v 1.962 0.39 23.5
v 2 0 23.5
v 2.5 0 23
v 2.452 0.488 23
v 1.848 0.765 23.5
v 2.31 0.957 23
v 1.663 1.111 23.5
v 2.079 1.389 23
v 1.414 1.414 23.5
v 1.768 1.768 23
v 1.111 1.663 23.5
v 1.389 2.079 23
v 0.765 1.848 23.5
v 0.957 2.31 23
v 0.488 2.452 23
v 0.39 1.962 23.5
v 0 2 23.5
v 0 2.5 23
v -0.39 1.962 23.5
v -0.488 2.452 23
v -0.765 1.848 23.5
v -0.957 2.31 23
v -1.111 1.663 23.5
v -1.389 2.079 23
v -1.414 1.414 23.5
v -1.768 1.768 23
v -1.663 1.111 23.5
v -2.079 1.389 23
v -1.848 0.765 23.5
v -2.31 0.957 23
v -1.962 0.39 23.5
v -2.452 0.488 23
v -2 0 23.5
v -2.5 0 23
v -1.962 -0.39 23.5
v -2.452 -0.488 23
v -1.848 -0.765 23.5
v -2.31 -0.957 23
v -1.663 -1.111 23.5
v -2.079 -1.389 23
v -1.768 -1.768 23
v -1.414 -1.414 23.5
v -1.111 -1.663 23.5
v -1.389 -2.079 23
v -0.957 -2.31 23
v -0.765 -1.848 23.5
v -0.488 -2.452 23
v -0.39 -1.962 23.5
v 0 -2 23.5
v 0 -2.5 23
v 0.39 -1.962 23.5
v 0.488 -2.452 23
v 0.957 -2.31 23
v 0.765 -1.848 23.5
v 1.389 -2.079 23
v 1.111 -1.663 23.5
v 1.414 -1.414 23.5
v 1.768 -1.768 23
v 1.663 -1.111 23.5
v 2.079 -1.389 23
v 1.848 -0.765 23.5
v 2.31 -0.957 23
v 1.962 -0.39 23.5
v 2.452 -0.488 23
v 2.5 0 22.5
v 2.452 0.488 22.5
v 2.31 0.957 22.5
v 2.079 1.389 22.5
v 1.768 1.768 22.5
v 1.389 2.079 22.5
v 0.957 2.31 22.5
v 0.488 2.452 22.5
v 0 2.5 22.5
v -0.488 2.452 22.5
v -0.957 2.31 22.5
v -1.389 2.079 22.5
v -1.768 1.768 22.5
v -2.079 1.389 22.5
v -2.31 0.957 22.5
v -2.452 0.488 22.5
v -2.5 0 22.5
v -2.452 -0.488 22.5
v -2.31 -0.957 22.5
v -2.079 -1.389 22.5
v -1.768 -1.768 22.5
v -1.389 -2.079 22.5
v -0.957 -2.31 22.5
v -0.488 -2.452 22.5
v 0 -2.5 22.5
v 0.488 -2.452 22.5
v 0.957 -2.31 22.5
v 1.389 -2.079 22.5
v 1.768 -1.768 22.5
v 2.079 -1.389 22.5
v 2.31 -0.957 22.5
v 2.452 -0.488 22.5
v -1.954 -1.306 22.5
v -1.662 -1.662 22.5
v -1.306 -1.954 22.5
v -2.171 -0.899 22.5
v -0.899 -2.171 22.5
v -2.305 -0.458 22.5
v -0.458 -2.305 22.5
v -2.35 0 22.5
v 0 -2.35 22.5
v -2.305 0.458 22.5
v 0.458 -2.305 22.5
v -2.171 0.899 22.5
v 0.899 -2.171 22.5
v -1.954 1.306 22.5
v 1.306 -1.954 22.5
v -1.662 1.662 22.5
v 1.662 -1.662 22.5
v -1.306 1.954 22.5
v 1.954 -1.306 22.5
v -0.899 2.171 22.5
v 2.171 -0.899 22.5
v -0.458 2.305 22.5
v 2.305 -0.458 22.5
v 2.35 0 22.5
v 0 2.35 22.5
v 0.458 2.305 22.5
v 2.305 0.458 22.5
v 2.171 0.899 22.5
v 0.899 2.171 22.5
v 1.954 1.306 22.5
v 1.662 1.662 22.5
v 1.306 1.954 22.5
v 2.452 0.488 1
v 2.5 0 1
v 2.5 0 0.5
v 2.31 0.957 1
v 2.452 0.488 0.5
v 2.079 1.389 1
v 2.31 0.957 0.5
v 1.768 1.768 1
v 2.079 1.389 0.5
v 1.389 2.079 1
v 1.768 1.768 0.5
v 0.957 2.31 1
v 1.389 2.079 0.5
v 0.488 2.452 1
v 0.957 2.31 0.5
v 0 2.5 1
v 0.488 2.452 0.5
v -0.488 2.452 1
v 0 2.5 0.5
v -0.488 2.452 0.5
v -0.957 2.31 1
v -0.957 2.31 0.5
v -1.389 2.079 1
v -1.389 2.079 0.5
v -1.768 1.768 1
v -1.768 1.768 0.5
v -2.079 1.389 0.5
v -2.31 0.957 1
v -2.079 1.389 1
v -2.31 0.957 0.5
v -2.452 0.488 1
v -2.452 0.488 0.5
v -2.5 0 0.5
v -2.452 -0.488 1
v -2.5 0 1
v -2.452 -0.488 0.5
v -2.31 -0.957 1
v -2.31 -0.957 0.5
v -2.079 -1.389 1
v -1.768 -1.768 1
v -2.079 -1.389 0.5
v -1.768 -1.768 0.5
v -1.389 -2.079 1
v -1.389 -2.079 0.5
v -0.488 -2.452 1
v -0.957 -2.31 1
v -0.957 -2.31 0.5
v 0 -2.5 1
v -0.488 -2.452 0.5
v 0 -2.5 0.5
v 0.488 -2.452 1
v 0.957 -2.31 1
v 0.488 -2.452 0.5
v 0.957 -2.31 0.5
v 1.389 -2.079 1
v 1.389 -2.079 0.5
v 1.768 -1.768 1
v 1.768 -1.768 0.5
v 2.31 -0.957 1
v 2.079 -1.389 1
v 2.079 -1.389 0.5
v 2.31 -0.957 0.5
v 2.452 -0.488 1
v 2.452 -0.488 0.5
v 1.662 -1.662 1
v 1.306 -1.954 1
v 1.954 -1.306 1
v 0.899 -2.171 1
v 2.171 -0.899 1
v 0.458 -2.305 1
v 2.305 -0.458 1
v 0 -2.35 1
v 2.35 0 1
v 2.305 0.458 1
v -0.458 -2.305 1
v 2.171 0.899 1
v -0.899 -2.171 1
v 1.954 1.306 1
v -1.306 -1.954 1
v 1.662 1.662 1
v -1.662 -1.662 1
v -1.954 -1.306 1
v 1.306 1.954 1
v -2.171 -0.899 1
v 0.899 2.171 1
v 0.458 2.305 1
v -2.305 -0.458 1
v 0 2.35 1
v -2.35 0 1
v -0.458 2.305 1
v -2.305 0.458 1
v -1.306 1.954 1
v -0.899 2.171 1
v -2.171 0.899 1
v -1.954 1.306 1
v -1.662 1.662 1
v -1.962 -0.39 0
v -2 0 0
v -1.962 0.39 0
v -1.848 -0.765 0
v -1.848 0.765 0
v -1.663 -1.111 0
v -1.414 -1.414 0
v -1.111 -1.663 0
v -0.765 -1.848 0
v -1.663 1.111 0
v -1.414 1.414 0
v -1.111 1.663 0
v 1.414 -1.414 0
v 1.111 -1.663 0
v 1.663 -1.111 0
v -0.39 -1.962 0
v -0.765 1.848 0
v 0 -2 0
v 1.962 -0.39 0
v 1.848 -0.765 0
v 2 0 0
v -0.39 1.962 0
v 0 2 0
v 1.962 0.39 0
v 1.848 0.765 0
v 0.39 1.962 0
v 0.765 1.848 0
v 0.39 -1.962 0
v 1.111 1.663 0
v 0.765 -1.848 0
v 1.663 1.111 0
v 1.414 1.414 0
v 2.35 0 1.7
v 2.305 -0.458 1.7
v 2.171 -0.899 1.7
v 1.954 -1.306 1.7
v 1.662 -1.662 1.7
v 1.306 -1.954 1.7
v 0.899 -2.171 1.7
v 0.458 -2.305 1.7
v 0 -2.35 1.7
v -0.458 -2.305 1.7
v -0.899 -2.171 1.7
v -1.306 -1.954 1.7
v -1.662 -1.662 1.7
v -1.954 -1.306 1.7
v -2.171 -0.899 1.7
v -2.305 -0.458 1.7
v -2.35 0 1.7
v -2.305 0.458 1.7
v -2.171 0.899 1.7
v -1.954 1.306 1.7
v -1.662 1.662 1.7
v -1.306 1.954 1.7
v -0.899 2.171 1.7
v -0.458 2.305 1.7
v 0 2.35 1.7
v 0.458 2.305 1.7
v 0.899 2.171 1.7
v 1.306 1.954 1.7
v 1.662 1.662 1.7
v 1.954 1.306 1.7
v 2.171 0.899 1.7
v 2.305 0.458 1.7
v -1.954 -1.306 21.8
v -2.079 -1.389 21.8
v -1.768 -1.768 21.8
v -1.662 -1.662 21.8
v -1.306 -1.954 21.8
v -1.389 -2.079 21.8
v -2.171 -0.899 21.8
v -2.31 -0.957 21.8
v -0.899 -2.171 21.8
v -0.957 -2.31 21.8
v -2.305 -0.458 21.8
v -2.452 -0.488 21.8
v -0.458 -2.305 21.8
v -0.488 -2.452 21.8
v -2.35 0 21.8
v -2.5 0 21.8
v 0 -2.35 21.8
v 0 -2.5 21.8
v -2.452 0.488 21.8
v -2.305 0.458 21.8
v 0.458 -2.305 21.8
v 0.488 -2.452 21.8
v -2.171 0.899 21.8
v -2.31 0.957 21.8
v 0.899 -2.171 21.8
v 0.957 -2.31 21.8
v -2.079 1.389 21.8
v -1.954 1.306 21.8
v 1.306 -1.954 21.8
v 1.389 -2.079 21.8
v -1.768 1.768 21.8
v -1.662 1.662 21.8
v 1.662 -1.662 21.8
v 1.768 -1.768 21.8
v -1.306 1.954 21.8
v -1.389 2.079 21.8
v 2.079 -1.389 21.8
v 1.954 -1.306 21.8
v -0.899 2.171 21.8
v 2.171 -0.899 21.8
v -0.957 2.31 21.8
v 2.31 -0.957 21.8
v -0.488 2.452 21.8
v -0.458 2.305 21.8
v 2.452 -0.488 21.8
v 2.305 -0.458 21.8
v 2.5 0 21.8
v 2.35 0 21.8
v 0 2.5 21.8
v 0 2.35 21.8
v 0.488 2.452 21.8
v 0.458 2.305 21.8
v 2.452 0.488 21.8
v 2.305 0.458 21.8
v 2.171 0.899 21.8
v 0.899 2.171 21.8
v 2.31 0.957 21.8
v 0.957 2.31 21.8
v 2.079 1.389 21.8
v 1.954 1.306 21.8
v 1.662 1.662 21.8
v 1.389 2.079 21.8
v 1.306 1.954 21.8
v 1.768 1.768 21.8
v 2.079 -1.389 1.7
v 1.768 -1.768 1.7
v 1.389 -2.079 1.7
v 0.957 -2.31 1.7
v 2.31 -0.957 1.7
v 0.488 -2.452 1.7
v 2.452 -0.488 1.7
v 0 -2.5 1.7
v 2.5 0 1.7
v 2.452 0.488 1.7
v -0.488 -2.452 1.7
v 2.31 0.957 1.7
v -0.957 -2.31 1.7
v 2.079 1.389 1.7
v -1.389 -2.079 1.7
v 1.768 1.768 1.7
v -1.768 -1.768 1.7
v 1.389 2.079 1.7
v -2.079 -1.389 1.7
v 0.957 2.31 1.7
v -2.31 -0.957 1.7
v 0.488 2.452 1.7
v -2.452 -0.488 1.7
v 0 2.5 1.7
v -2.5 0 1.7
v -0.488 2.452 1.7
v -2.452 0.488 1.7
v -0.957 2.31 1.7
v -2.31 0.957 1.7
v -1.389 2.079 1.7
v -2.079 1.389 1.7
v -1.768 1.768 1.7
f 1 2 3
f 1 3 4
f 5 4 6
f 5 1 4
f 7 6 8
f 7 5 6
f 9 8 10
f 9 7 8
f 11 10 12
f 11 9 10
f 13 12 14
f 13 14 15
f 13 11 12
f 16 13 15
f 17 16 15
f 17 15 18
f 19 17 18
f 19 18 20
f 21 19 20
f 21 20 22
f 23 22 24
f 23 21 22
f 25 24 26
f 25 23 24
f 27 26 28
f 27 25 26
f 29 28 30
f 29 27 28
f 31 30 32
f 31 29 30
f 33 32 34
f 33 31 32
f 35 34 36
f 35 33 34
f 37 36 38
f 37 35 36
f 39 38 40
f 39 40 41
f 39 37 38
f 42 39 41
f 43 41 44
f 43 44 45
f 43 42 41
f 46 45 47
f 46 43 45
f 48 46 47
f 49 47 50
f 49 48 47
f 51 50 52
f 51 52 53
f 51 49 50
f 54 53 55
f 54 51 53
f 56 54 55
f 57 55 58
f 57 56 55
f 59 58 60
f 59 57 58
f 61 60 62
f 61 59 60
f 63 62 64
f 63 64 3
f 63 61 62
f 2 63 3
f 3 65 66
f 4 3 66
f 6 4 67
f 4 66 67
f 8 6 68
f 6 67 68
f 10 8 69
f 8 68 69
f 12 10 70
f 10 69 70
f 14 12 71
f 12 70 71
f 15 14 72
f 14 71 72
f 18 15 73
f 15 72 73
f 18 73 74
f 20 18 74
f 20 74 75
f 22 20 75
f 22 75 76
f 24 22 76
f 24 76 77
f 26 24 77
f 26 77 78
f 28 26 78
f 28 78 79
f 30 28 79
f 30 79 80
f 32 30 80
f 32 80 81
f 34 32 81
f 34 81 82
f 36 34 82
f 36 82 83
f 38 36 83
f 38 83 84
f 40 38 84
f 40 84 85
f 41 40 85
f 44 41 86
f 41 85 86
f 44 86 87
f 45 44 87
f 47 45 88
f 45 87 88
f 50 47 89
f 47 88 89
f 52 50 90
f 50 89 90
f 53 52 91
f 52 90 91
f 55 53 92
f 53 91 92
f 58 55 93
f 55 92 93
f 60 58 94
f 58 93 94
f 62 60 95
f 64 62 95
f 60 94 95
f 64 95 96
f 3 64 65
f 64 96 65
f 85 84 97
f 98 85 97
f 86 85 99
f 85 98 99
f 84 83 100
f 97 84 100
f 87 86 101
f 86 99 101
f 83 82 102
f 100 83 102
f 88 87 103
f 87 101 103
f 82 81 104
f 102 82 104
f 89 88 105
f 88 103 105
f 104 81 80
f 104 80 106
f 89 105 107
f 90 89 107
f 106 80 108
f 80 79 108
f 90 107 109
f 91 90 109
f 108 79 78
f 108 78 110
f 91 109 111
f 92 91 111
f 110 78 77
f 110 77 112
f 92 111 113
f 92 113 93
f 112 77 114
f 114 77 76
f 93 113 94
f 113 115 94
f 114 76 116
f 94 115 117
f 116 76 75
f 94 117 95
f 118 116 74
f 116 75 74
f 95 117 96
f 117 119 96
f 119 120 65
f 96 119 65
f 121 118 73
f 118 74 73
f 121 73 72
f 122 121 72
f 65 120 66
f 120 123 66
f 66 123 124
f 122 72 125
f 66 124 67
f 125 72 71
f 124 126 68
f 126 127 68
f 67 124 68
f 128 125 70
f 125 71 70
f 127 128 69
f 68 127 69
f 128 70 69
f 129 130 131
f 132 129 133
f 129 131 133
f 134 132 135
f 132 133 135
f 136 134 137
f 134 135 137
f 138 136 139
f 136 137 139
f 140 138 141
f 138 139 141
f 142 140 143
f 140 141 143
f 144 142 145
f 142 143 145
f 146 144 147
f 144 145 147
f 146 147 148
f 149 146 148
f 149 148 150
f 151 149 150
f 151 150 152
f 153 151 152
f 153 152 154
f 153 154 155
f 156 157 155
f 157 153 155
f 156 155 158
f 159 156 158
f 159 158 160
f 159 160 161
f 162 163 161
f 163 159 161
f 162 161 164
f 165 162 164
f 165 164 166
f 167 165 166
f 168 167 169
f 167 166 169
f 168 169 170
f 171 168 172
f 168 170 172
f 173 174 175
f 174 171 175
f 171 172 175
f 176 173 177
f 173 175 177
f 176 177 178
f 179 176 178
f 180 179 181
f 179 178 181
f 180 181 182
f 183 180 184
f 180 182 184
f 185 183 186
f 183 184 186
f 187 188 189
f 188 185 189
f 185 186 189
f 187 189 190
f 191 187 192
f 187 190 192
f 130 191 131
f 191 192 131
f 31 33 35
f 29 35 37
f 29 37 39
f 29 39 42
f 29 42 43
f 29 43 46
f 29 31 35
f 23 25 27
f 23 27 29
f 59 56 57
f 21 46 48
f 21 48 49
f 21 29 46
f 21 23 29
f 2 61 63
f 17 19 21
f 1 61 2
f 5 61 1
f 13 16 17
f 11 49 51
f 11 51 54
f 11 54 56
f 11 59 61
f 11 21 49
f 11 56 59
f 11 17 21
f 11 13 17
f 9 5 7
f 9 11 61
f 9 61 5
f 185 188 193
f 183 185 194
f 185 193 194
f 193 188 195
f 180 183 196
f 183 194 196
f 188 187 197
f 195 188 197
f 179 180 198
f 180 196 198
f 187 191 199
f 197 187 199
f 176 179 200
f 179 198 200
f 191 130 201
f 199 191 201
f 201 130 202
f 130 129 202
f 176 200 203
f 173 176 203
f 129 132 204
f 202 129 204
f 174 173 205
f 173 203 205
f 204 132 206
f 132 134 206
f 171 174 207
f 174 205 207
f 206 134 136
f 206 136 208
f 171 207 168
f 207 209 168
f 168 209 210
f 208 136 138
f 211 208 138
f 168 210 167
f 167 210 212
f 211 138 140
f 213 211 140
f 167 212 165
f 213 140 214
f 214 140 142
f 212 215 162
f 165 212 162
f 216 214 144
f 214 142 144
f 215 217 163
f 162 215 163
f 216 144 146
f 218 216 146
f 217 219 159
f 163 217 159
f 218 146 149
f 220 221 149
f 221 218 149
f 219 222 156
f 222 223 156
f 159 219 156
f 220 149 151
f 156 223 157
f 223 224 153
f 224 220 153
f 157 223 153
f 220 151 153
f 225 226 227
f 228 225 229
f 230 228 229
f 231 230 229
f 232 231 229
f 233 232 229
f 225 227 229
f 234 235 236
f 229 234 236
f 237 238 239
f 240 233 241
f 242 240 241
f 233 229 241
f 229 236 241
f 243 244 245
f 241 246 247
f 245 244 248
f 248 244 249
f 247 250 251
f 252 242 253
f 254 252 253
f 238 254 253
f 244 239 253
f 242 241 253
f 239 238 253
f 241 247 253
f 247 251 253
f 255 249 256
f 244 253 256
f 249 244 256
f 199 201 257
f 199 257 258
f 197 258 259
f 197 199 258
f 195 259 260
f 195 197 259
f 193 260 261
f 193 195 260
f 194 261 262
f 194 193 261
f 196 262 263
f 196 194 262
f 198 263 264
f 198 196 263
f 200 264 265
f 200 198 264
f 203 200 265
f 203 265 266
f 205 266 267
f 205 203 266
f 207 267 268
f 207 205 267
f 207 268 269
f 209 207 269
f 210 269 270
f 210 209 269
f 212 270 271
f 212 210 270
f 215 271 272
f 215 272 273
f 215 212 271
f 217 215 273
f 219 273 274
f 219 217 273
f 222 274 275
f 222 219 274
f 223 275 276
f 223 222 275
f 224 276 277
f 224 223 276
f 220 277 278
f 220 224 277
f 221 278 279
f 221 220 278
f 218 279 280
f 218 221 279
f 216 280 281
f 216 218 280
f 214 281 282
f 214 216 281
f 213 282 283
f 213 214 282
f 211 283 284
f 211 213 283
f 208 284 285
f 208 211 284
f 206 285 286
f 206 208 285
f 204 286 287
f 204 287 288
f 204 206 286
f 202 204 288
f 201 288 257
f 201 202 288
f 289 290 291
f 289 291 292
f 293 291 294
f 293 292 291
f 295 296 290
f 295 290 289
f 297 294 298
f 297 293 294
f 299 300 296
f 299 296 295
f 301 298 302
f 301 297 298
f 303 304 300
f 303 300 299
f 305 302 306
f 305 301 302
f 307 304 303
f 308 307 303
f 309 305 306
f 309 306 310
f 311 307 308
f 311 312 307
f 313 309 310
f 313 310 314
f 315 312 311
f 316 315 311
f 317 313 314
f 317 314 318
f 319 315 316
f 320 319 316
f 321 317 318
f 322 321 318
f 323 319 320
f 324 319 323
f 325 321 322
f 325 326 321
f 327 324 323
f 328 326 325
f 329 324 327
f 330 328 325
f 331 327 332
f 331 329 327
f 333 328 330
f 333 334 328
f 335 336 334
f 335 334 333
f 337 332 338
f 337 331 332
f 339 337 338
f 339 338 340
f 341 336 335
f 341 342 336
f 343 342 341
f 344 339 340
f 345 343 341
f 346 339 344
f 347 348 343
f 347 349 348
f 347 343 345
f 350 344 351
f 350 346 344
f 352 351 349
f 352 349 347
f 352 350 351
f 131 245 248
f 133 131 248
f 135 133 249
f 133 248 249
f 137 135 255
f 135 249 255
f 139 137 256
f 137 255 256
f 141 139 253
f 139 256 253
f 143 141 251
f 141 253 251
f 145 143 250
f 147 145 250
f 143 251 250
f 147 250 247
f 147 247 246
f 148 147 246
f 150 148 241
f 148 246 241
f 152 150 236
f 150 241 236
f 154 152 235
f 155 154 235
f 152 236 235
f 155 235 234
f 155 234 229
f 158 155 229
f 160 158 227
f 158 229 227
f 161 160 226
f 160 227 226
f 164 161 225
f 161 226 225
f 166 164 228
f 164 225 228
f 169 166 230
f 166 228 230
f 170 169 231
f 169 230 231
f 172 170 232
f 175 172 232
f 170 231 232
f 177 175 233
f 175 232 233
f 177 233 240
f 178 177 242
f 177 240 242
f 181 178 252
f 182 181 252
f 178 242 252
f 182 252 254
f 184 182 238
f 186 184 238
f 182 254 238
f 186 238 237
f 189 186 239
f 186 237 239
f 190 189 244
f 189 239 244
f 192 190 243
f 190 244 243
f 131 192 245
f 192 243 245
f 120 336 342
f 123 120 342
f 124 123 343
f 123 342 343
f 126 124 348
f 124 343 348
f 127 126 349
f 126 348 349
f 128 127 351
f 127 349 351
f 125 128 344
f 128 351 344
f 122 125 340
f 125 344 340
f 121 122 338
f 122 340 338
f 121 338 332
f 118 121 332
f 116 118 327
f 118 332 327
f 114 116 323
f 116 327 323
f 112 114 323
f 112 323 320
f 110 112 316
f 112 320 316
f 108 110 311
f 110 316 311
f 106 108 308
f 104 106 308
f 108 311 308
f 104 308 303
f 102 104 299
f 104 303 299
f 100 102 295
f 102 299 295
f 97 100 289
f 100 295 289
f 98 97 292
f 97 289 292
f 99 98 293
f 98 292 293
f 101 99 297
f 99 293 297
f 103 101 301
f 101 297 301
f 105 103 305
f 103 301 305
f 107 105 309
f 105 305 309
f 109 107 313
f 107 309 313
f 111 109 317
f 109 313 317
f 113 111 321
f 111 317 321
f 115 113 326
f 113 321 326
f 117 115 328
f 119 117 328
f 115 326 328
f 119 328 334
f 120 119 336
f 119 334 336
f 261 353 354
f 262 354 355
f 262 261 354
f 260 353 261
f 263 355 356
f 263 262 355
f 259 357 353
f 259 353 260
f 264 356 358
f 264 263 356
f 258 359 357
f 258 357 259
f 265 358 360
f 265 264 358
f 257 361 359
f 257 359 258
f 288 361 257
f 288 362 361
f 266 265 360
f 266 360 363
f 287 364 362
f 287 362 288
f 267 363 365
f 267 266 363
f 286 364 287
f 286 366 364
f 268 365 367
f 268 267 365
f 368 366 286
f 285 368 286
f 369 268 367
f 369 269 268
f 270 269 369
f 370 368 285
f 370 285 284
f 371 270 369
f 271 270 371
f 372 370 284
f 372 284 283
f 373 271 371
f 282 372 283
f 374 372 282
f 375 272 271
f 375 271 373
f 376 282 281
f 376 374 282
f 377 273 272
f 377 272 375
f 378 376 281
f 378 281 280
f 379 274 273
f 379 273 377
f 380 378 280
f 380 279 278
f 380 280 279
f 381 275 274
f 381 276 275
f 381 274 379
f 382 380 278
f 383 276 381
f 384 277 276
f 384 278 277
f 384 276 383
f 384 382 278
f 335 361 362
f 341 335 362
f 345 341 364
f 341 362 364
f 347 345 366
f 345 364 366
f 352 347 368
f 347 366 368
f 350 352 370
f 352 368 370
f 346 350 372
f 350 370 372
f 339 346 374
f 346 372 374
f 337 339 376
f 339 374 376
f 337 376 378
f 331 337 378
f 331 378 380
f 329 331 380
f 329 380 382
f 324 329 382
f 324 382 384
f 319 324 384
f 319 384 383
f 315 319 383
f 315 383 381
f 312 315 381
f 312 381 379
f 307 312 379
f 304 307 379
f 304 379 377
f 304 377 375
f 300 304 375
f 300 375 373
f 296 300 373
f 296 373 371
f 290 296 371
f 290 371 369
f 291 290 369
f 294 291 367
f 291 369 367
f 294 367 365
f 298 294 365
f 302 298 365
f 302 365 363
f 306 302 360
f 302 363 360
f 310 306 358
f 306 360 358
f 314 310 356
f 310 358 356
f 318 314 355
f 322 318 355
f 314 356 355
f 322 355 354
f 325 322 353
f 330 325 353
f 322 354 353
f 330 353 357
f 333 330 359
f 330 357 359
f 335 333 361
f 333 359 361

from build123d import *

# Parameters (mm, degrees)
SZKIC1_R                    = 2.5
DODANIE_WYCI_GNI_CIE1_DEPTH = 23.5
SFAZOWANIE1_SIZE            = 0.5
WYTNIJ_WYCI_GNI_CIE1_START  = -1.7
SZKIC2_R                    = 2.5
SZKIC2_R_2                  = 2.35
WYTNIJ_WYCI_GNI_CIE1_DEPTH  = 0.7
WYTNIJ_WYCI_GNI_CIE2_START  = -1
SZKIC3_R                    = 2.5
SZKIC3_R_2                  = 2.35
WYTNIJ_WYCI_GNI_CIE2_DEPTH  = 0.7


with BuildPart() as part:
    # Szkic1 → Dodanie-wyciągnięcie1 (new body)
    with BuildSketch(Plane.XY):
        Circle(SZKIC1_R)
    extrude(amount=DODANIE_WYCI_GNI_CIE1_DEPTH)

    # Sfazowanie1
    sfazowanie1_edges = [part.edges().sort_by_distance(p)[0] for p in [
        (-2.5, 0, 0),
        (-2.5, 0, 23.5),
    ]]
    chamfer(sfazowanie1_edges, length=SFAZOWANIE1_SIZE)

    # Szkic2 → Wytnij-wyciągnięcie1 (cut)
    with BuildSketch(Plane.XY.offset(23.5).offset(WYTNIJ_WYCI_GNI_CIE1_START)):
        Circle(SZKIC2_R)
        Circle(SZKIC2_R_2, mode=Mode.SUBTRACT)
    extrude(amount=WYTNIJ_WYCI_GNI_CIE1_DEPTH, mode=Mode.SUBTRACT)

    # Szkic3 → Wytnij-wyciągnięcie2 (cut)
    with BuildSketch(Plane(origin=(0, 0, 0), x_dir=(-1, 0, 0), z_dir=(0, 0, -1)).offset(WYTNIJ_WYCI_GNI_CIE2_START)):
        Circle(SZKIC3_R)
        with Locations(Location((0, 0, 0), (0, 0, 180))):
            Circle(SZKIC3_R_2, mode=Mode.SUBTRACT)
    extrude(amount=-WYTNIJ_WYCI_GNI_CIE2_DEPTH, mode=Mode.SUBTRACT)


solid = part.part
